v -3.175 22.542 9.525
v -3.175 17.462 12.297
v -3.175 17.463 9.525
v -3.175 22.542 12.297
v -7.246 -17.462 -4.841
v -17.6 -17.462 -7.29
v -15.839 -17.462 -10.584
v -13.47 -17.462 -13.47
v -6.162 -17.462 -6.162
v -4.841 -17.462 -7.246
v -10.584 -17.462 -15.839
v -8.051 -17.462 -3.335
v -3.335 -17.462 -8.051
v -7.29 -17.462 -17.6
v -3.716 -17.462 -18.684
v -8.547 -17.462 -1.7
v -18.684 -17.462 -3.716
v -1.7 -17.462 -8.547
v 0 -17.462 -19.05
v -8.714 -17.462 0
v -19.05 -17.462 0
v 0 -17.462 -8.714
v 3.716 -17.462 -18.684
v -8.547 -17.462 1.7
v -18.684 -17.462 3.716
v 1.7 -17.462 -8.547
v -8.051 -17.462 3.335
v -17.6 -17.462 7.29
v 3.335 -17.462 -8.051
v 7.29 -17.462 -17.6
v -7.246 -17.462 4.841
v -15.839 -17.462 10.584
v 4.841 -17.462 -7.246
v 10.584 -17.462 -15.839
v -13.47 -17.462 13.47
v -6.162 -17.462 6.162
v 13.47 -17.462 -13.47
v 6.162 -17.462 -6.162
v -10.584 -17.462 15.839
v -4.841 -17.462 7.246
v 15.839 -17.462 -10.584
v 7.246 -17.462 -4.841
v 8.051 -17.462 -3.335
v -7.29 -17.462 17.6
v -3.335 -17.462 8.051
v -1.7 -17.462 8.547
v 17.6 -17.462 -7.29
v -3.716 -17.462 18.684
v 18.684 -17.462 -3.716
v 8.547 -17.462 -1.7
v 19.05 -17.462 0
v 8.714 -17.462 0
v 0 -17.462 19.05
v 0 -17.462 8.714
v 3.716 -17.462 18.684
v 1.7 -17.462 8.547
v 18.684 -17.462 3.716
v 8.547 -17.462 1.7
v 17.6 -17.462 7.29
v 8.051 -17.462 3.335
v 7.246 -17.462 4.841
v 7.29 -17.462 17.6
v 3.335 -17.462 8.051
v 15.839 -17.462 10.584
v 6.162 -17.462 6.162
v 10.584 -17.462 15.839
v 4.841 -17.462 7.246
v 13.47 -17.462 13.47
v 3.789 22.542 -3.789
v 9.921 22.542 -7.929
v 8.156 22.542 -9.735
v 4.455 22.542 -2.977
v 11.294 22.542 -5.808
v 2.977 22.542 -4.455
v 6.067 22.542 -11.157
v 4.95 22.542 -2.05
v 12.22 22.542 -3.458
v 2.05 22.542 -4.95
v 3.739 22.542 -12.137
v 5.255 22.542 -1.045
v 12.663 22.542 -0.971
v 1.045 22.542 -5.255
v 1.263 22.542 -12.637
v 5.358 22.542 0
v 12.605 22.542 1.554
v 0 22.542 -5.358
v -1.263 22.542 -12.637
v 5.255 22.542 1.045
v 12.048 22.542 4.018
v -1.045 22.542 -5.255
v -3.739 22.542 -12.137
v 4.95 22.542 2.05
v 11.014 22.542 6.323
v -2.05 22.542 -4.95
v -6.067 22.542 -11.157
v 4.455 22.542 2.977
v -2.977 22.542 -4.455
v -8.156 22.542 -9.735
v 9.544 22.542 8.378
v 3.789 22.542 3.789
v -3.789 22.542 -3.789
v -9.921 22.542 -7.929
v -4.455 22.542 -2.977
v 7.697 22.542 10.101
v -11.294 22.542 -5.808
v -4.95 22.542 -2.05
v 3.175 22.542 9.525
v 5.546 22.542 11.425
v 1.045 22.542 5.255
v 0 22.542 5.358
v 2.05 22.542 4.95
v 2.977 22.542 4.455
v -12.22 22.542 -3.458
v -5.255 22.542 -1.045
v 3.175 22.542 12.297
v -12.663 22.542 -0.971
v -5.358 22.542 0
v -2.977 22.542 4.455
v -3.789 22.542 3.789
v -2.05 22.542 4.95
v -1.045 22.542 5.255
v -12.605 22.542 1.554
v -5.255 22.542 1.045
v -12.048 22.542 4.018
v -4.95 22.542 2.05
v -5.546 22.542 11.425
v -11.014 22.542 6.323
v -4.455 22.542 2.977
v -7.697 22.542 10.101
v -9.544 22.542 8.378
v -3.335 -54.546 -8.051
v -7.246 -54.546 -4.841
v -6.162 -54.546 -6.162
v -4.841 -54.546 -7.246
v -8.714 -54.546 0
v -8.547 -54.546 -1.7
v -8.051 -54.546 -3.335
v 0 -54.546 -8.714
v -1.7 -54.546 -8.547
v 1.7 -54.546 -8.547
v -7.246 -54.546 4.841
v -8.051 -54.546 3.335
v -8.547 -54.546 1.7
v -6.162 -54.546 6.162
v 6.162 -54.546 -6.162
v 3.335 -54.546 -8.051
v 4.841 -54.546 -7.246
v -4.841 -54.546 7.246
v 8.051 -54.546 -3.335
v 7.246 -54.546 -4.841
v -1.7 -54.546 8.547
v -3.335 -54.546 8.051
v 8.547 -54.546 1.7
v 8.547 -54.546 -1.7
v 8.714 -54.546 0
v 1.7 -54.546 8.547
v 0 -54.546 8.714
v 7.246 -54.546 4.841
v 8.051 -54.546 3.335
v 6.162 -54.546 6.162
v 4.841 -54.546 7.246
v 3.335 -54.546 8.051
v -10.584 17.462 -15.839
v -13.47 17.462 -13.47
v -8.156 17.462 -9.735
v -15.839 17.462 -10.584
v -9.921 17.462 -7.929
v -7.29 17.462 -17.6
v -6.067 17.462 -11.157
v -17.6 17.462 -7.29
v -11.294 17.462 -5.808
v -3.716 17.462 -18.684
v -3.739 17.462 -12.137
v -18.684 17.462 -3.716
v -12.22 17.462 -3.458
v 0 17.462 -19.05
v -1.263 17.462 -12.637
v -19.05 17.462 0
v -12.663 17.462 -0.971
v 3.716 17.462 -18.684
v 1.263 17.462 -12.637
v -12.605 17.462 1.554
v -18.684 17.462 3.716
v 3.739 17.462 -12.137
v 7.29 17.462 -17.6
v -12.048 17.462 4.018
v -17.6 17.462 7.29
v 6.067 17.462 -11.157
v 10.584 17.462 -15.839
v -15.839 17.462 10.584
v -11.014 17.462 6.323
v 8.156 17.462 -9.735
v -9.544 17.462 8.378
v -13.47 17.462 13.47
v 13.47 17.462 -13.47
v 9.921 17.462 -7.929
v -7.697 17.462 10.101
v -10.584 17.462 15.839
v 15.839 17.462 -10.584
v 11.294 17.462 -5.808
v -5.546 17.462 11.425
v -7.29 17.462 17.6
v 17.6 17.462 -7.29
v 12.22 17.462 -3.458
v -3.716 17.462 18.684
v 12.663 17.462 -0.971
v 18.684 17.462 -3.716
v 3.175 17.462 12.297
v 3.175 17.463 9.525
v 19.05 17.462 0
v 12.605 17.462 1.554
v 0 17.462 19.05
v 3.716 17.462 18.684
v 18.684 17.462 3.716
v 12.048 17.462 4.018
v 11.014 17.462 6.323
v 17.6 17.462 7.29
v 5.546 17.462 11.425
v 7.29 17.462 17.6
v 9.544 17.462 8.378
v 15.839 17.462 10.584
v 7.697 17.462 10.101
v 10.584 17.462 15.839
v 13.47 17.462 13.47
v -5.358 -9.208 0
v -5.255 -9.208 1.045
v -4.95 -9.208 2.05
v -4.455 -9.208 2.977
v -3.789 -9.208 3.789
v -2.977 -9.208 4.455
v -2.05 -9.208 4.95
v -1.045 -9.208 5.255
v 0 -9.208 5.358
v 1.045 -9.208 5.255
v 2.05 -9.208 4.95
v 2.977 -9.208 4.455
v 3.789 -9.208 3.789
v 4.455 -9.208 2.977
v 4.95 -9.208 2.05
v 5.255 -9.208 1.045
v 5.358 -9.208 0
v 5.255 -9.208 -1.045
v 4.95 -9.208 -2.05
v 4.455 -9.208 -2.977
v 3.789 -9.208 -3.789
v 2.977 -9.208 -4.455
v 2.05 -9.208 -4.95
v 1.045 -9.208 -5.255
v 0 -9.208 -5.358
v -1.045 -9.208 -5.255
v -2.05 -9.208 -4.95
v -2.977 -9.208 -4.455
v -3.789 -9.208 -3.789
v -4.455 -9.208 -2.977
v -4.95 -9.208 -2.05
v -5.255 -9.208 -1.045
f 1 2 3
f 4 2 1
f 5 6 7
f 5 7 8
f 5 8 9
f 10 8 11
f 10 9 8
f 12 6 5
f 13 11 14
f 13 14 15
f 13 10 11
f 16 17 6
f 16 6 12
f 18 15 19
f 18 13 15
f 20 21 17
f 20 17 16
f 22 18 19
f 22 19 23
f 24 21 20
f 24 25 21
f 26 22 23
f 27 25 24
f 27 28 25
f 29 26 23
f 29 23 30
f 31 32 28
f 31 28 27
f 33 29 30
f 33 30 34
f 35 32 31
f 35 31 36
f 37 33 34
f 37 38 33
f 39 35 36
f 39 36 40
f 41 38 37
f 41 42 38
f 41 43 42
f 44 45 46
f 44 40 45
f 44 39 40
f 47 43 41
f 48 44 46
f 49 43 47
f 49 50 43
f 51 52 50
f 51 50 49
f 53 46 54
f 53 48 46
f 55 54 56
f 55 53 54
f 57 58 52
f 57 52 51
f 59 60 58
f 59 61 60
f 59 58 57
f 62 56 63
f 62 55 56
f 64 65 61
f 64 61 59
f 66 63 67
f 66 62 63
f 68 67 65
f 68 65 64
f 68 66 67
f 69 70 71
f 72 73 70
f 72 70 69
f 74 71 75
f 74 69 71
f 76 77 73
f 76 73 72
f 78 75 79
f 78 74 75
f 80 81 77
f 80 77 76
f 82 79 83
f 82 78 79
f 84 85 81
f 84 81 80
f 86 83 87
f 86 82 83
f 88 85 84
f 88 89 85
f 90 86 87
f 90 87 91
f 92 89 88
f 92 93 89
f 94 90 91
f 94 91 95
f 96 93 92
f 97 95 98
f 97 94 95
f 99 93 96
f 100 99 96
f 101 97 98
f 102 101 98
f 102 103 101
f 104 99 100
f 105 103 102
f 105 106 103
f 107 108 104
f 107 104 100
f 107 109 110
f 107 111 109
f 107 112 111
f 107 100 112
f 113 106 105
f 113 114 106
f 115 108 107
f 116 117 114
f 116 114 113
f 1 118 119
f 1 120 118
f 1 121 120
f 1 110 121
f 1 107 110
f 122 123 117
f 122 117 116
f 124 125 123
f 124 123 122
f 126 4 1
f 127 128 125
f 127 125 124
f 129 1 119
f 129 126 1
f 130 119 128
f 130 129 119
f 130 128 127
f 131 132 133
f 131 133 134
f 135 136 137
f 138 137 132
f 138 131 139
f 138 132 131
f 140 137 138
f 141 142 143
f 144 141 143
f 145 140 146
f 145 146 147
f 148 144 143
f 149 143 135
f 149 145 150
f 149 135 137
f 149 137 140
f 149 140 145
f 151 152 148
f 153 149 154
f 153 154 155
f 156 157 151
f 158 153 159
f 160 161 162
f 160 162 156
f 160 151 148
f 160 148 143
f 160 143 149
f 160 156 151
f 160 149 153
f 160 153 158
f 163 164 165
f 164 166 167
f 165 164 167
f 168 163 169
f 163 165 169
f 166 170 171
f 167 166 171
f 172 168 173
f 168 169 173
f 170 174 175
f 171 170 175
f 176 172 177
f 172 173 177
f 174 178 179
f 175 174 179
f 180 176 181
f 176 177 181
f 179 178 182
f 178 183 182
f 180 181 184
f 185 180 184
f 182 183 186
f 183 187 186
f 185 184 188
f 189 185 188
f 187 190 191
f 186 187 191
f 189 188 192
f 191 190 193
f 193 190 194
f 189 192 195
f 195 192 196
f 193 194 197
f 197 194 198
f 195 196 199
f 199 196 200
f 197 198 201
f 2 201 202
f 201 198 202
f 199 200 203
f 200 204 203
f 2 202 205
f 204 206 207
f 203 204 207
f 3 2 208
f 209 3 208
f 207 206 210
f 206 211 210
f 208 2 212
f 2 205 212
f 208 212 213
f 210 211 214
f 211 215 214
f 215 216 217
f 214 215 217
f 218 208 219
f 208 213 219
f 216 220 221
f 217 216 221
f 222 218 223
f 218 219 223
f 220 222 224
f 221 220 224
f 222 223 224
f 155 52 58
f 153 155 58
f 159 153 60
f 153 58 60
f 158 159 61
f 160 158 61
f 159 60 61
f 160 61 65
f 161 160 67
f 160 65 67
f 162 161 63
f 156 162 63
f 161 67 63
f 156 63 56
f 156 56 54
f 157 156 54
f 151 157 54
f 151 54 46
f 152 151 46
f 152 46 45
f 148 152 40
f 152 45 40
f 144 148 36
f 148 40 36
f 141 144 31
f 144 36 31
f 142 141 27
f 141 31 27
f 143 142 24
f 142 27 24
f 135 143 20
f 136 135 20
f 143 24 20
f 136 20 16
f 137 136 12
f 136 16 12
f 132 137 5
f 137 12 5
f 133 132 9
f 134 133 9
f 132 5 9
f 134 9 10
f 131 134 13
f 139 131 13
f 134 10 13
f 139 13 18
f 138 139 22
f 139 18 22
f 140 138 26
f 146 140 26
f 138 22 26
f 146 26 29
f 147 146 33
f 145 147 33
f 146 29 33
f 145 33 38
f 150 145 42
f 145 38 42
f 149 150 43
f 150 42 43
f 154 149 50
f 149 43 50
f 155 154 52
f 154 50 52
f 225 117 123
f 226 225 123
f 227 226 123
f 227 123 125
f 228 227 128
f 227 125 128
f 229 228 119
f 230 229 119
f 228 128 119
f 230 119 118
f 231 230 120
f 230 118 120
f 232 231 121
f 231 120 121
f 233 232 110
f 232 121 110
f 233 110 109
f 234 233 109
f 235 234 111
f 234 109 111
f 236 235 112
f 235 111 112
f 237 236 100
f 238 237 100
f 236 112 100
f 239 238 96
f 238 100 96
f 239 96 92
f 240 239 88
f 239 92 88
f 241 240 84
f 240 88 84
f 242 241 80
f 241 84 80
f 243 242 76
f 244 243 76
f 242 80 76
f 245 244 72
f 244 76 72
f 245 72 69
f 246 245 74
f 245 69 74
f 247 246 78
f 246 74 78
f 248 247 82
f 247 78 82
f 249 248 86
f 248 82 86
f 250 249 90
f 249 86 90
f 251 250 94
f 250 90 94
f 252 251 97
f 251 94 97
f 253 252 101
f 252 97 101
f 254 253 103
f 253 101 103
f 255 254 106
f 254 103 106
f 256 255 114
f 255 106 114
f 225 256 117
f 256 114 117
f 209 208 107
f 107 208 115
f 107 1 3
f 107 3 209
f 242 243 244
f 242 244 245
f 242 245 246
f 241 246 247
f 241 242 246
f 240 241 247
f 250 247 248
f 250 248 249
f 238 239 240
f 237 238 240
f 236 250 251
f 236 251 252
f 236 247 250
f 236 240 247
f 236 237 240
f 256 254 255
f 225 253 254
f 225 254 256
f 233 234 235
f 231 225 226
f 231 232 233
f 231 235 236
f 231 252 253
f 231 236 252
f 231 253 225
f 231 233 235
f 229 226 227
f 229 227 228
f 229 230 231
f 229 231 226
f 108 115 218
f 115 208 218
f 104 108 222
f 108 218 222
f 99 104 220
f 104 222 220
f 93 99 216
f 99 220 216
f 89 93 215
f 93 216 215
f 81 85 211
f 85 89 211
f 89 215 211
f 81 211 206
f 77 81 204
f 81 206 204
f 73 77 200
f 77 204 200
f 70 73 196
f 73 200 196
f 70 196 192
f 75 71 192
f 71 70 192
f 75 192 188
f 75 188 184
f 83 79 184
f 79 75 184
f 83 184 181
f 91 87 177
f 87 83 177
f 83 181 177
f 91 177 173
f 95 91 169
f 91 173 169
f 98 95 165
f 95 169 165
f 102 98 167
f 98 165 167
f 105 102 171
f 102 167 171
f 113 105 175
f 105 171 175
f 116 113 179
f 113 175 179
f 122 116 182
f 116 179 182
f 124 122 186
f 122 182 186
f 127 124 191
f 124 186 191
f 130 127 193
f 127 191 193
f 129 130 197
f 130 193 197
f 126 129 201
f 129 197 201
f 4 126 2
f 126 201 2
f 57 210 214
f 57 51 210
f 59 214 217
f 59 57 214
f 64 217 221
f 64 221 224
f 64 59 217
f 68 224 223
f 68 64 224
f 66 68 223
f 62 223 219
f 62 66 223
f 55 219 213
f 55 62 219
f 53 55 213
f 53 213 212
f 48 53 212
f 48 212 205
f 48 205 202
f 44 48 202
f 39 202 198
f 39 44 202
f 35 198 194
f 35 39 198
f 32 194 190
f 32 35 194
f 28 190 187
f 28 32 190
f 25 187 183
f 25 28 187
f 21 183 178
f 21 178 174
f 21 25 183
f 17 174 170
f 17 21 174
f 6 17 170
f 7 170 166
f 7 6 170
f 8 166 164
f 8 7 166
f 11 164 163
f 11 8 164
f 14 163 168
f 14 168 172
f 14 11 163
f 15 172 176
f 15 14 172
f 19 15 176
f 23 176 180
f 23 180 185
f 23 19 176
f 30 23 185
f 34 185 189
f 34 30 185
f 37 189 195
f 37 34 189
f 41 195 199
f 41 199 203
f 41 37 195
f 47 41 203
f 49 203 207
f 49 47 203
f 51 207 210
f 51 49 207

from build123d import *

# Parameters (mm, degrees)
F0_R      = 19.05
F1_DEPTH  = 17.4625
F2_R      = 8.7141687226
F3_DEPTH  = 37.084
F4_R      = 12.7
F5_DEPTH  = 5.08
F6_R      = 5.3581350259
F7_DEPTH  = 31.75
F10_W     = 6.35
F10_H     = 5.08
F11_DEPTH = 3.175


with BuildPart() as f1:
    # F0 (on Front) → F1 (new body, symmetric)
    with BuildSketch(Plane.XZ):
        Circle(F0_R)
    extrude(amount=F1_DEPTH, both=True)

    # F2 (on face) → F3 (join)
    with BuildSketch(Plane.XZ.offset(17.4625)):
        Circle(F2_R)
    extrude(amount=F3_DEPTH)

    # F4 (on face) → F5 (join)
    with BuildSketch(Plane(origin=(0, 17.4625, 0), x_dir=(-1, 0, 0), z_dir=(0, 1, 0))):
        Circle(F4_R)
    extrude(amount=F5_DEPTH)

    # F6 (on face) → F7 (cut)
    with BuildSketch(Plane(origin=(0, 22.5425, 0), x_dir=(-1, 0, 0), z_dir=(0, 1, 0))):
        Circle(F6_R)
    extrude(amount=-F7_DEPTH, mode=Mode.SUBTRACT)

    # F10 (on plane+point) → F11 (cut)
    with BuildSketch(Plane.XY.offset(12.7)):
        with Locations((0, 20.0025)):
            Rectangle(F10_W, F10_H)
    extrude(amount=-F11_DEPTH, mode=Mode.SUBTRACT)


solid = f1.part
